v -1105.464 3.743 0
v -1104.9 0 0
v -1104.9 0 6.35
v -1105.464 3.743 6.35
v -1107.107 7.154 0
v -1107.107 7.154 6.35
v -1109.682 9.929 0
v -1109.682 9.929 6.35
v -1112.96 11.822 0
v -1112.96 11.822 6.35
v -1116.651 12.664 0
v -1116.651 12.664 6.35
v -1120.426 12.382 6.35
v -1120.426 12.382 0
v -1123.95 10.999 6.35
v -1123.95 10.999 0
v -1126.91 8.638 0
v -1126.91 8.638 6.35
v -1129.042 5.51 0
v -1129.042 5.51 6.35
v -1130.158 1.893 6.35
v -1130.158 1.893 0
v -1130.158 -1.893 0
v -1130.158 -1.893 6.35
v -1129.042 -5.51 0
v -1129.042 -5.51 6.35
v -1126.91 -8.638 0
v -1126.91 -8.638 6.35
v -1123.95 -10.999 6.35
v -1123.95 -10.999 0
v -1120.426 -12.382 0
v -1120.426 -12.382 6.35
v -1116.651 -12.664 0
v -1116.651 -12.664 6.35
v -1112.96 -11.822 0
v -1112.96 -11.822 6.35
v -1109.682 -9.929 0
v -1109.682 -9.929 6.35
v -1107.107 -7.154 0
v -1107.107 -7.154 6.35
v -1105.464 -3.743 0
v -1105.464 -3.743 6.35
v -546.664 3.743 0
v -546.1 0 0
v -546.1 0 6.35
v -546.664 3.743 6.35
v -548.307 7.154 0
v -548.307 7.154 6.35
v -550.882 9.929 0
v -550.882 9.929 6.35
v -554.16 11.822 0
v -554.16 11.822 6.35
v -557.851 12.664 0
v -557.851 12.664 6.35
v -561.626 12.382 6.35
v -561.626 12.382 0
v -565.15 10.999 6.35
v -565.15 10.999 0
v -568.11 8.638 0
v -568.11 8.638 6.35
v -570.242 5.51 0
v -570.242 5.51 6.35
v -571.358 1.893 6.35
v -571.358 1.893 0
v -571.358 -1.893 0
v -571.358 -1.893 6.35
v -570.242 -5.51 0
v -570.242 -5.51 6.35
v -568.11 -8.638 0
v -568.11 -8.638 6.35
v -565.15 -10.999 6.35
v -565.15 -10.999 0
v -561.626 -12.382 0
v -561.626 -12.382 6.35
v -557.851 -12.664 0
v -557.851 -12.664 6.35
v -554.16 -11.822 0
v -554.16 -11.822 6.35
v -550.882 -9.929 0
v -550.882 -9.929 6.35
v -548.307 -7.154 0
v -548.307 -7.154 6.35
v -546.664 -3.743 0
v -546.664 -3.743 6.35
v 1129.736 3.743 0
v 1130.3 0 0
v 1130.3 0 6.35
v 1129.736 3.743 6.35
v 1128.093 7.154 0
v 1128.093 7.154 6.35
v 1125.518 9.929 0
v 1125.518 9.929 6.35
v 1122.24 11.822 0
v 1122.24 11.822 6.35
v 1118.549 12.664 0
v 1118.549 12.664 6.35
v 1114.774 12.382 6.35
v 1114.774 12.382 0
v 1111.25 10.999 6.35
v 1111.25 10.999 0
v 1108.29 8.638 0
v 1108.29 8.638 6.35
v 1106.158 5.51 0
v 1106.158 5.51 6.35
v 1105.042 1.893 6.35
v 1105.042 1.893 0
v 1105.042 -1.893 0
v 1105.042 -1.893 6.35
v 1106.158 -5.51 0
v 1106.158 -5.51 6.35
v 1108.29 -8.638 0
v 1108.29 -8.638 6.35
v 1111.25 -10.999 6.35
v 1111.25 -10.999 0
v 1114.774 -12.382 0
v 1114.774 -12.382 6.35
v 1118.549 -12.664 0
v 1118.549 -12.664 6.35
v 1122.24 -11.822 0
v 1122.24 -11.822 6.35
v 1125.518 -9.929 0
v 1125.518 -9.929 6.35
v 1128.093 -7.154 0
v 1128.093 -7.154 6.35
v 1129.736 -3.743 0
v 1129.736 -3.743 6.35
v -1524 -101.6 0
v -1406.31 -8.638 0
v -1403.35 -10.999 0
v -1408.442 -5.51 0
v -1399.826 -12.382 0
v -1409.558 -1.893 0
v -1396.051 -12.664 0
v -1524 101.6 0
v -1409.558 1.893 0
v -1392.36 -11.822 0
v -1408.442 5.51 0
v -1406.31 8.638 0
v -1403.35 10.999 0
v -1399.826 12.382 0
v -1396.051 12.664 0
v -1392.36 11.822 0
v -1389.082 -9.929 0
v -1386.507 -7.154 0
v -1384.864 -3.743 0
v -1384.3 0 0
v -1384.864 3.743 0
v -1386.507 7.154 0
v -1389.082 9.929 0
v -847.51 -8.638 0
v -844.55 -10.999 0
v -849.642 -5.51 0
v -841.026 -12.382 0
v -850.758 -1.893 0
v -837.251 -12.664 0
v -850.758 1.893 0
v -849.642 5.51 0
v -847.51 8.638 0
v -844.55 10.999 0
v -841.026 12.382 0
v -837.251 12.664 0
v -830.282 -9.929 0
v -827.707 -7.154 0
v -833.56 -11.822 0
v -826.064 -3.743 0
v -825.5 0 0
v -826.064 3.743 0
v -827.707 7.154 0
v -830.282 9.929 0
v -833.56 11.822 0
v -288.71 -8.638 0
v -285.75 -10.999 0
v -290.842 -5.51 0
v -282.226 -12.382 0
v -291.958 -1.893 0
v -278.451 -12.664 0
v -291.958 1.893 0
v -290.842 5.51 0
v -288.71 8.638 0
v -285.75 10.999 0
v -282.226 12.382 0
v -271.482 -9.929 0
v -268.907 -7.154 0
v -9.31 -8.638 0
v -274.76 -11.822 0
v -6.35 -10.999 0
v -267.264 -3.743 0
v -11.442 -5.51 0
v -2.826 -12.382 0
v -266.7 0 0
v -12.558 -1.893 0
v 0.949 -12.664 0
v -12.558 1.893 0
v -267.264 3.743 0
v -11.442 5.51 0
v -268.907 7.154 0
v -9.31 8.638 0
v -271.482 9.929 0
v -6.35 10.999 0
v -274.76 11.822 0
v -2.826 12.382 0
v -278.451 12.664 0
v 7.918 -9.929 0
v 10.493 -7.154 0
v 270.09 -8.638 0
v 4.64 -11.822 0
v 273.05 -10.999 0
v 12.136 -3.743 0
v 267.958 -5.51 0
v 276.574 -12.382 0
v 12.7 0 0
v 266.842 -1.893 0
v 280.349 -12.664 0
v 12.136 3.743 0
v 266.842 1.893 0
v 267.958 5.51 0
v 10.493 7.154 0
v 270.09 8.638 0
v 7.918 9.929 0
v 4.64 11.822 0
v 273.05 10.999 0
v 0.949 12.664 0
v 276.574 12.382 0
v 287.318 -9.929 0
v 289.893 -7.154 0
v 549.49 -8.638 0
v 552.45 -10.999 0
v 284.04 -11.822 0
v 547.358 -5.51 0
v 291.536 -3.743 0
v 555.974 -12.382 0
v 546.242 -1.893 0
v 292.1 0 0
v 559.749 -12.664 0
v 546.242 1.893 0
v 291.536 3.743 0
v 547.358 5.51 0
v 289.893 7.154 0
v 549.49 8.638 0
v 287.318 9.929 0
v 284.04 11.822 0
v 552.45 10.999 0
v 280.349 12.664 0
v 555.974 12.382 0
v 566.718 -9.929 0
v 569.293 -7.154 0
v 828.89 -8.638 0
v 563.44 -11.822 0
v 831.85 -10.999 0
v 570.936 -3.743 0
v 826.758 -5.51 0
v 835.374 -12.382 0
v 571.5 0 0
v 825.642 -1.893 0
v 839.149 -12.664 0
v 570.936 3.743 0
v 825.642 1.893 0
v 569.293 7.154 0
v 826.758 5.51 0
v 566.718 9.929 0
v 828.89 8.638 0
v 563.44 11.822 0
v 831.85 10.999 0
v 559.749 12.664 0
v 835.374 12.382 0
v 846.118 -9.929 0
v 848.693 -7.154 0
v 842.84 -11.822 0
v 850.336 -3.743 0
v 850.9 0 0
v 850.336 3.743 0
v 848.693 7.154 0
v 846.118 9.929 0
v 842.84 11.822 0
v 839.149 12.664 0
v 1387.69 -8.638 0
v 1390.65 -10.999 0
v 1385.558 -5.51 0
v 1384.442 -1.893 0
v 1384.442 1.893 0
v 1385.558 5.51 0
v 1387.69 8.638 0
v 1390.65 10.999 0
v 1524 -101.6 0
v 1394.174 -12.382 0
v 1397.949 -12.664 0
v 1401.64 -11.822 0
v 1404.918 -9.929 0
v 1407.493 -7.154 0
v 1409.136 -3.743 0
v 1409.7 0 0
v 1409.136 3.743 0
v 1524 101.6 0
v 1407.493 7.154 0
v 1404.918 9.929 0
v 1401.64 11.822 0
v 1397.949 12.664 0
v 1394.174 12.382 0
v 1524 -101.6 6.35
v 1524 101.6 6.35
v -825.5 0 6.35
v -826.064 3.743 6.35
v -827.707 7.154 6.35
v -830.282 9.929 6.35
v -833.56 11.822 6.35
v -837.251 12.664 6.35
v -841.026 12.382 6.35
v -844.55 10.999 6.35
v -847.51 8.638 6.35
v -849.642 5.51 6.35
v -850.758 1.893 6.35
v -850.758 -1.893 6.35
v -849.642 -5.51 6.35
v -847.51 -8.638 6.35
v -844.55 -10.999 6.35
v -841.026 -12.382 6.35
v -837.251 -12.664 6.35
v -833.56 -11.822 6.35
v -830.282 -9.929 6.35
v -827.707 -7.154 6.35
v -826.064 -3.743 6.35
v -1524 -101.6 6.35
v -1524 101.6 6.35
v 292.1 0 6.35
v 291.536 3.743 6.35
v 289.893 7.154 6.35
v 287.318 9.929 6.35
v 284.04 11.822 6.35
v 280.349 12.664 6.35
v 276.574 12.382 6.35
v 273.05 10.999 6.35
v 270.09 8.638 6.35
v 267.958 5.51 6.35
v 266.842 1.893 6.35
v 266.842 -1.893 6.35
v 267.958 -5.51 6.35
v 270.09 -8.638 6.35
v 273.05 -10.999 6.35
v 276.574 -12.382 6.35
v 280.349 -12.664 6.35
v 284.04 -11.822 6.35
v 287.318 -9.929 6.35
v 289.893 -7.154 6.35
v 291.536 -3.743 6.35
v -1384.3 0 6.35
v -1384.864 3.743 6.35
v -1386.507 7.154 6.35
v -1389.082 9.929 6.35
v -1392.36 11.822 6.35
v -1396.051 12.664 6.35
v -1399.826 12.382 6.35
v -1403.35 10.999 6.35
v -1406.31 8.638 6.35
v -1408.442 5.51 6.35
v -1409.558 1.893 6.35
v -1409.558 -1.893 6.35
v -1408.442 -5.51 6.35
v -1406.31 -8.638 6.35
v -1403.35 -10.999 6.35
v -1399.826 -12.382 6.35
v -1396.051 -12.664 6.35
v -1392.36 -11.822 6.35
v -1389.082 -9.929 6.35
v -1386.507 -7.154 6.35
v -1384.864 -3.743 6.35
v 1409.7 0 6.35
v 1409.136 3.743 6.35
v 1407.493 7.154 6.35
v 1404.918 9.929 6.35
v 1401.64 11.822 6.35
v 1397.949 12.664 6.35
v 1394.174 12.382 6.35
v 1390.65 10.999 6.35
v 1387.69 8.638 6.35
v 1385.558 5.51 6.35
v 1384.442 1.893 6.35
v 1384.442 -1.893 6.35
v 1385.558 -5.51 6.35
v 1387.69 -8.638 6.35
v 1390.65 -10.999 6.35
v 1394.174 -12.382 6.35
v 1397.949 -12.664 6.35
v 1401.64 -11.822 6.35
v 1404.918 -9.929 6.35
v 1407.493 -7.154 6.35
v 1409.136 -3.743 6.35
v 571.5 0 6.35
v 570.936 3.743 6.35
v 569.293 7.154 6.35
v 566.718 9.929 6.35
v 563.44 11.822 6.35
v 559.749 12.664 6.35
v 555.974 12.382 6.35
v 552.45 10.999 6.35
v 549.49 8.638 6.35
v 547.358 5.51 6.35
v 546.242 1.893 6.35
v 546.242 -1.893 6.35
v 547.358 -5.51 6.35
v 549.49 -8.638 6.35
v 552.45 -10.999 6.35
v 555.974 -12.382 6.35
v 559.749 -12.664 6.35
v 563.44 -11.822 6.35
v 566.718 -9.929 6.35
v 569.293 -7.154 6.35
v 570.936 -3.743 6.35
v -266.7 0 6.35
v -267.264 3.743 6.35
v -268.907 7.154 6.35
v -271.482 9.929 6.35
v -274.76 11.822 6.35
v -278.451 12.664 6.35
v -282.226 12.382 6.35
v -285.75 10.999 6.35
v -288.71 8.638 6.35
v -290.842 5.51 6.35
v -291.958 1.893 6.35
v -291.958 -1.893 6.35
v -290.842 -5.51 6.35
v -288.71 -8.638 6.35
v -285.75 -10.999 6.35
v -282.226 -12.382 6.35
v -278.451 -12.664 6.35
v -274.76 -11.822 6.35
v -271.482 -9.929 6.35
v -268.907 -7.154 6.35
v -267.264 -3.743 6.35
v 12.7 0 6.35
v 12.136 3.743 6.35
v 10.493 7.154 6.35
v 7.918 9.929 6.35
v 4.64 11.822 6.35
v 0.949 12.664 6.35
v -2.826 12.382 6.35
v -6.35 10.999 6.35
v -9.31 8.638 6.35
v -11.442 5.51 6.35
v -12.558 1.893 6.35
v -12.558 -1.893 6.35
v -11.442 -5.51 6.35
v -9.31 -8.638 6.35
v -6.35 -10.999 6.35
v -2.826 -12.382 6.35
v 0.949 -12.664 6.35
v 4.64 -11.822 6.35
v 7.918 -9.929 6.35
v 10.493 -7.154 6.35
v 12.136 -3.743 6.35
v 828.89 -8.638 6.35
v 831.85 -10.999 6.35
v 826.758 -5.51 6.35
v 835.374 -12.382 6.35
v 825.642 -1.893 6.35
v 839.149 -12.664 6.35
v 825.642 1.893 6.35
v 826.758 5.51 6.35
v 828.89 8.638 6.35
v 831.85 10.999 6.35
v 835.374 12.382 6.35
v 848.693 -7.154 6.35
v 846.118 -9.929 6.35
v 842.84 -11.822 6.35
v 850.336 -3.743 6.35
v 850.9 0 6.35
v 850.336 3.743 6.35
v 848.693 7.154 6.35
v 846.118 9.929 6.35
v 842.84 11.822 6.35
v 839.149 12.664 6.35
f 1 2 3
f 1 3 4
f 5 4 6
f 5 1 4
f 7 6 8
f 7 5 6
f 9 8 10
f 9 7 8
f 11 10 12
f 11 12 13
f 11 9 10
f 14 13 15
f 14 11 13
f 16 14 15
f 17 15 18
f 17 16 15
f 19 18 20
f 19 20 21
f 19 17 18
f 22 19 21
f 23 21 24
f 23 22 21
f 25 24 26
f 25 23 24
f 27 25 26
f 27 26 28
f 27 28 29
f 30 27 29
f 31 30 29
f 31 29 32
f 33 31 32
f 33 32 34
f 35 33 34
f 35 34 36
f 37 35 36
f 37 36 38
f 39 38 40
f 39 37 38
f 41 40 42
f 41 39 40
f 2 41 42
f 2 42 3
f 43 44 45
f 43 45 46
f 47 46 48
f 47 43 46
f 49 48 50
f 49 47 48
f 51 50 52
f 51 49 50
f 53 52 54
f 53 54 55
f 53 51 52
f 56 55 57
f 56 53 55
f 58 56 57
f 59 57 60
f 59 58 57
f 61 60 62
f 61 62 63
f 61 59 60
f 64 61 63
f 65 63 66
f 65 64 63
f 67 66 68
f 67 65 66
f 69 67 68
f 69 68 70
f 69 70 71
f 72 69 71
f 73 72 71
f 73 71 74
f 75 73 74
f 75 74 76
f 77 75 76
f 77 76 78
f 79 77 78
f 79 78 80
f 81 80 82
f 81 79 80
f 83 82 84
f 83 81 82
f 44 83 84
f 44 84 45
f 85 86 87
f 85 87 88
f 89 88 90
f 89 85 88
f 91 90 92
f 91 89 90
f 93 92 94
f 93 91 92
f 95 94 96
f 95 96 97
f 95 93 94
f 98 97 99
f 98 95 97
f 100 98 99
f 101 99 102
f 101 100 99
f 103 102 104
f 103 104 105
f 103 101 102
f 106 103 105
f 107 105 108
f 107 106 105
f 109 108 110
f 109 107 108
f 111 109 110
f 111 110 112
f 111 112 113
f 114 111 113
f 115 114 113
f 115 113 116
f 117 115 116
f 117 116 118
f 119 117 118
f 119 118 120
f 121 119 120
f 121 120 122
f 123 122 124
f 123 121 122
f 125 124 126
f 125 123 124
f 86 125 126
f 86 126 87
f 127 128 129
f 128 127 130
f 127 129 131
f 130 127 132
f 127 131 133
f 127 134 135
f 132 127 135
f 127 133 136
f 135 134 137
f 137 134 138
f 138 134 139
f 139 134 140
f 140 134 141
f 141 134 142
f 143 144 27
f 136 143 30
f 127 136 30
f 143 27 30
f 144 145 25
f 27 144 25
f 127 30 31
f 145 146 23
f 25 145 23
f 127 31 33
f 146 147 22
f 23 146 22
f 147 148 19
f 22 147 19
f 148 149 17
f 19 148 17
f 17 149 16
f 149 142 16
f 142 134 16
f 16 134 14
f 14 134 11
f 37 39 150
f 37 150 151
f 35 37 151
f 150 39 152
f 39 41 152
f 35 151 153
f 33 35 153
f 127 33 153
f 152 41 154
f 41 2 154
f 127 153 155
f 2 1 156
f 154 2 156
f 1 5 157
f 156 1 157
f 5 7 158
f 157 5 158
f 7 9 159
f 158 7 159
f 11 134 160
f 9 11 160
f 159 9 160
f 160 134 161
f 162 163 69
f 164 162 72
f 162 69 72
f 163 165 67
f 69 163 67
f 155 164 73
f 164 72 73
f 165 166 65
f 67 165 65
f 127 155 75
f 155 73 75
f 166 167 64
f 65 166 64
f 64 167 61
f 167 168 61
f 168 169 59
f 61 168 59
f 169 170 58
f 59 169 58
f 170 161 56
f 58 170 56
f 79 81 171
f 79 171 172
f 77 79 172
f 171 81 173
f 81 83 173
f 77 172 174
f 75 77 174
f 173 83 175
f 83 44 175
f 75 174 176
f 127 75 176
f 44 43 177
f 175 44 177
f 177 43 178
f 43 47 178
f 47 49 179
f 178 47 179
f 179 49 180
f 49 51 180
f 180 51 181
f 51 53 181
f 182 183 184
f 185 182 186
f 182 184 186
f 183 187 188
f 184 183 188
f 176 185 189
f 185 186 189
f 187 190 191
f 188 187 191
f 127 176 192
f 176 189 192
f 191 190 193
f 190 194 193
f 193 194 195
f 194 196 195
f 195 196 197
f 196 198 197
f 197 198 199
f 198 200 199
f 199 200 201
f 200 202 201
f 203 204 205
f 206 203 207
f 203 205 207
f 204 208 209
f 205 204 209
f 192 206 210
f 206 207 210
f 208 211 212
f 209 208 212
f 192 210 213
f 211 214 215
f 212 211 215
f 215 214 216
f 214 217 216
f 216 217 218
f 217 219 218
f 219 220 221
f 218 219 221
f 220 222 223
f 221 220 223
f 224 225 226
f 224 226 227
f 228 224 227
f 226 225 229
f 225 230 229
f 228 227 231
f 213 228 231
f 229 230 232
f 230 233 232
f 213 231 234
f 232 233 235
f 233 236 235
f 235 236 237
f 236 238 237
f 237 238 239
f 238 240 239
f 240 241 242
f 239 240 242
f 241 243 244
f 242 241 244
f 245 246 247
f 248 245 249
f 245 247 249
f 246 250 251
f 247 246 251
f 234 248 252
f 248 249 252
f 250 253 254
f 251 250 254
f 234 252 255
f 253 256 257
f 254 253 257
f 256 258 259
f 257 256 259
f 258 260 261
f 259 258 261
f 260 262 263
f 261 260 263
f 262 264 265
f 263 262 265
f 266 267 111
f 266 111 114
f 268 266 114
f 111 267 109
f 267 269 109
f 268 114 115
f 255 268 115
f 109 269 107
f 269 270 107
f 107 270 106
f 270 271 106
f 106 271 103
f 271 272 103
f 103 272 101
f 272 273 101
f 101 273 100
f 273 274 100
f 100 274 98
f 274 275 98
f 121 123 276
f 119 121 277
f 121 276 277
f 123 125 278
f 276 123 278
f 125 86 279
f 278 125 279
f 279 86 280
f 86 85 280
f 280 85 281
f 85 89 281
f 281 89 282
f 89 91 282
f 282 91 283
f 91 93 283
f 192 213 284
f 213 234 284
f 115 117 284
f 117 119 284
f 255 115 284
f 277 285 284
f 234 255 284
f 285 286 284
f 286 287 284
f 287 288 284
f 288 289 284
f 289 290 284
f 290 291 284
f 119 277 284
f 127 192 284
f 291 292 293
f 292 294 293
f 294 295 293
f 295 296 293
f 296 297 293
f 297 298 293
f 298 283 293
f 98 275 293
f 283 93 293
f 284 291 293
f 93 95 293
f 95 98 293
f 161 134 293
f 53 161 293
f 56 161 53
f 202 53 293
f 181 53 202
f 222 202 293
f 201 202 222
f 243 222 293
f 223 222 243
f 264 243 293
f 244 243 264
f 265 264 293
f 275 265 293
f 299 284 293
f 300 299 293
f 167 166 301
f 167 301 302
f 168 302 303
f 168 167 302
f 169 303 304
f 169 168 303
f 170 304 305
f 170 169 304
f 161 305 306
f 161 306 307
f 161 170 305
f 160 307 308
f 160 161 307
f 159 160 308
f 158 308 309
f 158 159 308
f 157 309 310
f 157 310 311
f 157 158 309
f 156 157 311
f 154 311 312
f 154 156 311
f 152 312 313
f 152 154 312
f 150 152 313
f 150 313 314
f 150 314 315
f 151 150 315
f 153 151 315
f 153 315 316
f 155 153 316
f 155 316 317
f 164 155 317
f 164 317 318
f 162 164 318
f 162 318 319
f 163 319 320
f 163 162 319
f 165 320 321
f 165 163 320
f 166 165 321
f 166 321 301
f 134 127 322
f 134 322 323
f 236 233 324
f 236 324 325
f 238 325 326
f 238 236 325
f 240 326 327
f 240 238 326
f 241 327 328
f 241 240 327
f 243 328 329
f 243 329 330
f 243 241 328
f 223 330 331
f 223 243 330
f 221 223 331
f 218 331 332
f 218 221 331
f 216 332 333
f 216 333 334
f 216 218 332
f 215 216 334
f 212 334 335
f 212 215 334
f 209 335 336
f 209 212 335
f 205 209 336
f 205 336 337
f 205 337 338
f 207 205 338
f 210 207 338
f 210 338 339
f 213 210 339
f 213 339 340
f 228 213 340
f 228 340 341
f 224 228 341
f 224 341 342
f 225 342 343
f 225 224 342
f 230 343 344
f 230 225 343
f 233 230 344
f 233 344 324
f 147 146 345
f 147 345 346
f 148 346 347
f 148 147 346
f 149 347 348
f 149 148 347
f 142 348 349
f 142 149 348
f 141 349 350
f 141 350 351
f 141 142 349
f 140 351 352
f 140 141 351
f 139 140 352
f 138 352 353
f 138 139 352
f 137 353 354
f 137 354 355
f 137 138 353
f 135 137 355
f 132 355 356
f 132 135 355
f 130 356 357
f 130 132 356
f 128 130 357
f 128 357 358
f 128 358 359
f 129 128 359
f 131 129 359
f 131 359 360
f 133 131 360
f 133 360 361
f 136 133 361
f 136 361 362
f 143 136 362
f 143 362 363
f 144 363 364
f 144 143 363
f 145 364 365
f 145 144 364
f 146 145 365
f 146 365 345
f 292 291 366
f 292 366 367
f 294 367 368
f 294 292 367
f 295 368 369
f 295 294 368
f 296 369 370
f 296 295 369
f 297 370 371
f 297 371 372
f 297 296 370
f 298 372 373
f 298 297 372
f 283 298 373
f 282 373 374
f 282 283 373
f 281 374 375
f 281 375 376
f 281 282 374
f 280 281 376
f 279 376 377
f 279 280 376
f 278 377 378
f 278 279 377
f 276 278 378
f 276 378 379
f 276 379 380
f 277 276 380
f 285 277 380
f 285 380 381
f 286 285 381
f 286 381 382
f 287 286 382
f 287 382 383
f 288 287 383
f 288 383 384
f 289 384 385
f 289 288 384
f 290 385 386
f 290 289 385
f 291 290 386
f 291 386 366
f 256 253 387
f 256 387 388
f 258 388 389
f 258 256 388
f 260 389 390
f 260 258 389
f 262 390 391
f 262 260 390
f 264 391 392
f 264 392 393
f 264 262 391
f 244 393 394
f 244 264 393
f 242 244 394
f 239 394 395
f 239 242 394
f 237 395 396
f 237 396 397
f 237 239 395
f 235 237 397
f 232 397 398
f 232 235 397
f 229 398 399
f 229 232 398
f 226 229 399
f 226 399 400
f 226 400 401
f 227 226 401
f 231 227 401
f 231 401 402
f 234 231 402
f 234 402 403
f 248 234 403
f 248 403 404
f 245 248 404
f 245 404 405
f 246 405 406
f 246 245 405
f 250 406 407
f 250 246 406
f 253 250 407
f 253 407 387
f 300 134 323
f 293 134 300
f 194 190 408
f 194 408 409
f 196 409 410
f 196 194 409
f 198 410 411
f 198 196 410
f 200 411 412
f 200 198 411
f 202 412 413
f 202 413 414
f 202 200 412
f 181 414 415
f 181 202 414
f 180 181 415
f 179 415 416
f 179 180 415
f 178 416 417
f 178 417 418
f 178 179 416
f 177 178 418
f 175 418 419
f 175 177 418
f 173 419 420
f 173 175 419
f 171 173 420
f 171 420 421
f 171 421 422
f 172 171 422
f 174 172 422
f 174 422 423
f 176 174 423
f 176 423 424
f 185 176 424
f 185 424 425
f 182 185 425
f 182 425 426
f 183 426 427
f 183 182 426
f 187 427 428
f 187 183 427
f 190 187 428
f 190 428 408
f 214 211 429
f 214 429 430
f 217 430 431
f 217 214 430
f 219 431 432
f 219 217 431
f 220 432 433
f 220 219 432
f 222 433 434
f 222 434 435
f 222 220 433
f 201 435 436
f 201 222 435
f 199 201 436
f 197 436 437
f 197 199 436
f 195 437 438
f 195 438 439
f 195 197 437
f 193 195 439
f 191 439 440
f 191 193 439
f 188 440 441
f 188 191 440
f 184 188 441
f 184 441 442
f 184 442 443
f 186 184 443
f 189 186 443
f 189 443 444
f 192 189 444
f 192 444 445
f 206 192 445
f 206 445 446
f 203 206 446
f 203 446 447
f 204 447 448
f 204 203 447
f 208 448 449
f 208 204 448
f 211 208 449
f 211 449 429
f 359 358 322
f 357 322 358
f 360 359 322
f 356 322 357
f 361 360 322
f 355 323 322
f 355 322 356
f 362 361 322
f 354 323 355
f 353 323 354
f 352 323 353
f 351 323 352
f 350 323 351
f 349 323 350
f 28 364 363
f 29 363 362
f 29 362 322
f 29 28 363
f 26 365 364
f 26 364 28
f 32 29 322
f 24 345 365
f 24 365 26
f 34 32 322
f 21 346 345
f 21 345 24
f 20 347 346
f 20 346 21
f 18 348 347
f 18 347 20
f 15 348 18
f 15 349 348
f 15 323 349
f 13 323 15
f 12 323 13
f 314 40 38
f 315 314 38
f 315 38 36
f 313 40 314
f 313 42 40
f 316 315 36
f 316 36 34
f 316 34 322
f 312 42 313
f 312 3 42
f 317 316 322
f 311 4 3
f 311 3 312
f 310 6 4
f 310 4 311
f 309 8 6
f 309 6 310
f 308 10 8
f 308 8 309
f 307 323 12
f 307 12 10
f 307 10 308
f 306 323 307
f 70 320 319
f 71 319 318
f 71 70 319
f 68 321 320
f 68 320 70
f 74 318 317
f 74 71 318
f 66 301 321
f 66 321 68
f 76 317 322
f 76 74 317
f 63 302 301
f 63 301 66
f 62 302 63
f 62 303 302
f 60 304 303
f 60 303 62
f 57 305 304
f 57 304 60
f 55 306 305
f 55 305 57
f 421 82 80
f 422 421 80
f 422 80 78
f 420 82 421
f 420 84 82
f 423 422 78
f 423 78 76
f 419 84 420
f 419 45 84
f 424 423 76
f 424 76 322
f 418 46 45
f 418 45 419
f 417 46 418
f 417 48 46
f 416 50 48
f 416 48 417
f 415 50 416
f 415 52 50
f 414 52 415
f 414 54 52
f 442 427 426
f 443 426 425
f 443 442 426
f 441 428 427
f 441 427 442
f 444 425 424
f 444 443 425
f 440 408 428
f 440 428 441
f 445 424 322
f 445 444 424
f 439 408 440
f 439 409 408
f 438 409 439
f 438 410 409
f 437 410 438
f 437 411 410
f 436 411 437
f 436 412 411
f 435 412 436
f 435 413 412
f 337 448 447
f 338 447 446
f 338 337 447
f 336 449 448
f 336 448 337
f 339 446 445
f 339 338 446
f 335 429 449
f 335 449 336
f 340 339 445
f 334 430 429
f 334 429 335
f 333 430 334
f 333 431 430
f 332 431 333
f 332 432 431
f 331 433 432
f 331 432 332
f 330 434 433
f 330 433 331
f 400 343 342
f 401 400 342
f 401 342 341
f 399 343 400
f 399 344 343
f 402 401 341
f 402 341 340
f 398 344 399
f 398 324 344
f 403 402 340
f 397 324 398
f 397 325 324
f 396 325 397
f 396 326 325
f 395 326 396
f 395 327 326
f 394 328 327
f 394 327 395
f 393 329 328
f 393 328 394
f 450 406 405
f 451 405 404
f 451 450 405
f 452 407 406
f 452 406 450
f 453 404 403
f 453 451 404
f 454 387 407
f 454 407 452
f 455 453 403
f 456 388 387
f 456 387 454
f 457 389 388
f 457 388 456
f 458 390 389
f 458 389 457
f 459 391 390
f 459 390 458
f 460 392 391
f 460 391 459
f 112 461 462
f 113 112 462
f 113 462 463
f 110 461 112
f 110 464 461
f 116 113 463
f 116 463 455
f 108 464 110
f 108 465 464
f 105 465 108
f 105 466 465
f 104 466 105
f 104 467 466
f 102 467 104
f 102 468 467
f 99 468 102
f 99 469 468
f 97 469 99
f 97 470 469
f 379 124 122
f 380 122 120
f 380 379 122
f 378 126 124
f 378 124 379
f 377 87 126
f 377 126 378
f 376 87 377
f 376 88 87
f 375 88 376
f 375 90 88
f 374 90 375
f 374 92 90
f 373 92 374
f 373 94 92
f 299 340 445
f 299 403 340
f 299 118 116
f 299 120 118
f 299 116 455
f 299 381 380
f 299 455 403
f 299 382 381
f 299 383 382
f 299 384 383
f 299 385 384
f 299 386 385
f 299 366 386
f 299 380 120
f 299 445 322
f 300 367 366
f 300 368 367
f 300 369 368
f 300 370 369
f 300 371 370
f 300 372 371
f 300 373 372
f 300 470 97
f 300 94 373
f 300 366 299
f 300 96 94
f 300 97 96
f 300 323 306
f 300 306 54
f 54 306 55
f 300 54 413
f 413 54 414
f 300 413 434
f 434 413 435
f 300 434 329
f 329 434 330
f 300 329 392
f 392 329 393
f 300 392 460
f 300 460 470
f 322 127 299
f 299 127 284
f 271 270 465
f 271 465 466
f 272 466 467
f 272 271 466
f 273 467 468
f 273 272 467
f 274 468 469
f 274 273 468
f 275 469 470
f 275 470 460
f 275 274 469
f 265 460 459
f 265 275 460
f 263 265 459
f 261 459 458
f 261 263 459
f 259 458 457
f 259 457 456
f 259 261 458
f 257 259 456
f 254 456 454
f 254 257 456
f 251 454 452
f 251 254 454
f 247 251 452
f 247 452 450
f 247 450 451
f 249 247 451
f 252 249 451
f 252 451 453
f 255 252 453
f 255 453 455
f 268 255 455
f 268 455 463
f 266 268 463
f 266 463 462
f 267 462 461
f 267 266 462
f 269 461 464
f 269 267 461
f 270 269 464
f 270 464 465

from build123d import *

# Parameters (mm, degrees)
SKETCH1_W           = 3048
SKETCH1_H           = 203.2
SKETCH1_R           = 12.7
BOSS_EXTRUDE1_DEPTH = 6.35


with BuildPart() as part:
    # Sketch1 → Boss-Extrude1 (new body)
    with BuildSketch(Plane.XY):
        Rectangle(SKETCH1_W, SKETCH1_H)
        with Locations((-1397, 0)):
            Circle(SKETCH1_R, mode=Mode.SUBTRACT)
        with Locations((-1117.6, 0)):
            Circle(SKETCH1_R, mode=Mode.SUBTRACT)
        with Locations((-838.2, 0)):
            Circle(SKETCH1_R, mode=Mode.SUBTRACT)
        with Locations((-558.8, 0)):
            Circle(SKETCH1_R, mode=Mode.SUBTRACT)
        with Locations((-279.4, 0)):
            Circle(SKETCH1_R, mode=Mode.SUBTRACT)
        Circle(SKETCH1_R, mode=Mode.SUBTRACT)
        with Locations((279.4, 0)):
            Circle(SKETCH1_R, mode=Mode.SUBTRACT)
        with Locations((558.8, 0)):
            Circle(SKETCH1_R, mode=Mode.SUBTRACT)
        with Locations((838.2, 0)):
            Circle(SKETCH1_R, mode=Mode.SUBTRACT)
        with Locations((1117.6, 0)):
            Circle(SKETCH1_R, mode=Mode.SUBTRACT)
        with Locations((1397, 0)):
            Circle(SKETCH1_R, mode=Mode.SUBTRACT)
    extrude(amount=BOSS_EXTRUDE1_DEPTH)


solid = part.part
